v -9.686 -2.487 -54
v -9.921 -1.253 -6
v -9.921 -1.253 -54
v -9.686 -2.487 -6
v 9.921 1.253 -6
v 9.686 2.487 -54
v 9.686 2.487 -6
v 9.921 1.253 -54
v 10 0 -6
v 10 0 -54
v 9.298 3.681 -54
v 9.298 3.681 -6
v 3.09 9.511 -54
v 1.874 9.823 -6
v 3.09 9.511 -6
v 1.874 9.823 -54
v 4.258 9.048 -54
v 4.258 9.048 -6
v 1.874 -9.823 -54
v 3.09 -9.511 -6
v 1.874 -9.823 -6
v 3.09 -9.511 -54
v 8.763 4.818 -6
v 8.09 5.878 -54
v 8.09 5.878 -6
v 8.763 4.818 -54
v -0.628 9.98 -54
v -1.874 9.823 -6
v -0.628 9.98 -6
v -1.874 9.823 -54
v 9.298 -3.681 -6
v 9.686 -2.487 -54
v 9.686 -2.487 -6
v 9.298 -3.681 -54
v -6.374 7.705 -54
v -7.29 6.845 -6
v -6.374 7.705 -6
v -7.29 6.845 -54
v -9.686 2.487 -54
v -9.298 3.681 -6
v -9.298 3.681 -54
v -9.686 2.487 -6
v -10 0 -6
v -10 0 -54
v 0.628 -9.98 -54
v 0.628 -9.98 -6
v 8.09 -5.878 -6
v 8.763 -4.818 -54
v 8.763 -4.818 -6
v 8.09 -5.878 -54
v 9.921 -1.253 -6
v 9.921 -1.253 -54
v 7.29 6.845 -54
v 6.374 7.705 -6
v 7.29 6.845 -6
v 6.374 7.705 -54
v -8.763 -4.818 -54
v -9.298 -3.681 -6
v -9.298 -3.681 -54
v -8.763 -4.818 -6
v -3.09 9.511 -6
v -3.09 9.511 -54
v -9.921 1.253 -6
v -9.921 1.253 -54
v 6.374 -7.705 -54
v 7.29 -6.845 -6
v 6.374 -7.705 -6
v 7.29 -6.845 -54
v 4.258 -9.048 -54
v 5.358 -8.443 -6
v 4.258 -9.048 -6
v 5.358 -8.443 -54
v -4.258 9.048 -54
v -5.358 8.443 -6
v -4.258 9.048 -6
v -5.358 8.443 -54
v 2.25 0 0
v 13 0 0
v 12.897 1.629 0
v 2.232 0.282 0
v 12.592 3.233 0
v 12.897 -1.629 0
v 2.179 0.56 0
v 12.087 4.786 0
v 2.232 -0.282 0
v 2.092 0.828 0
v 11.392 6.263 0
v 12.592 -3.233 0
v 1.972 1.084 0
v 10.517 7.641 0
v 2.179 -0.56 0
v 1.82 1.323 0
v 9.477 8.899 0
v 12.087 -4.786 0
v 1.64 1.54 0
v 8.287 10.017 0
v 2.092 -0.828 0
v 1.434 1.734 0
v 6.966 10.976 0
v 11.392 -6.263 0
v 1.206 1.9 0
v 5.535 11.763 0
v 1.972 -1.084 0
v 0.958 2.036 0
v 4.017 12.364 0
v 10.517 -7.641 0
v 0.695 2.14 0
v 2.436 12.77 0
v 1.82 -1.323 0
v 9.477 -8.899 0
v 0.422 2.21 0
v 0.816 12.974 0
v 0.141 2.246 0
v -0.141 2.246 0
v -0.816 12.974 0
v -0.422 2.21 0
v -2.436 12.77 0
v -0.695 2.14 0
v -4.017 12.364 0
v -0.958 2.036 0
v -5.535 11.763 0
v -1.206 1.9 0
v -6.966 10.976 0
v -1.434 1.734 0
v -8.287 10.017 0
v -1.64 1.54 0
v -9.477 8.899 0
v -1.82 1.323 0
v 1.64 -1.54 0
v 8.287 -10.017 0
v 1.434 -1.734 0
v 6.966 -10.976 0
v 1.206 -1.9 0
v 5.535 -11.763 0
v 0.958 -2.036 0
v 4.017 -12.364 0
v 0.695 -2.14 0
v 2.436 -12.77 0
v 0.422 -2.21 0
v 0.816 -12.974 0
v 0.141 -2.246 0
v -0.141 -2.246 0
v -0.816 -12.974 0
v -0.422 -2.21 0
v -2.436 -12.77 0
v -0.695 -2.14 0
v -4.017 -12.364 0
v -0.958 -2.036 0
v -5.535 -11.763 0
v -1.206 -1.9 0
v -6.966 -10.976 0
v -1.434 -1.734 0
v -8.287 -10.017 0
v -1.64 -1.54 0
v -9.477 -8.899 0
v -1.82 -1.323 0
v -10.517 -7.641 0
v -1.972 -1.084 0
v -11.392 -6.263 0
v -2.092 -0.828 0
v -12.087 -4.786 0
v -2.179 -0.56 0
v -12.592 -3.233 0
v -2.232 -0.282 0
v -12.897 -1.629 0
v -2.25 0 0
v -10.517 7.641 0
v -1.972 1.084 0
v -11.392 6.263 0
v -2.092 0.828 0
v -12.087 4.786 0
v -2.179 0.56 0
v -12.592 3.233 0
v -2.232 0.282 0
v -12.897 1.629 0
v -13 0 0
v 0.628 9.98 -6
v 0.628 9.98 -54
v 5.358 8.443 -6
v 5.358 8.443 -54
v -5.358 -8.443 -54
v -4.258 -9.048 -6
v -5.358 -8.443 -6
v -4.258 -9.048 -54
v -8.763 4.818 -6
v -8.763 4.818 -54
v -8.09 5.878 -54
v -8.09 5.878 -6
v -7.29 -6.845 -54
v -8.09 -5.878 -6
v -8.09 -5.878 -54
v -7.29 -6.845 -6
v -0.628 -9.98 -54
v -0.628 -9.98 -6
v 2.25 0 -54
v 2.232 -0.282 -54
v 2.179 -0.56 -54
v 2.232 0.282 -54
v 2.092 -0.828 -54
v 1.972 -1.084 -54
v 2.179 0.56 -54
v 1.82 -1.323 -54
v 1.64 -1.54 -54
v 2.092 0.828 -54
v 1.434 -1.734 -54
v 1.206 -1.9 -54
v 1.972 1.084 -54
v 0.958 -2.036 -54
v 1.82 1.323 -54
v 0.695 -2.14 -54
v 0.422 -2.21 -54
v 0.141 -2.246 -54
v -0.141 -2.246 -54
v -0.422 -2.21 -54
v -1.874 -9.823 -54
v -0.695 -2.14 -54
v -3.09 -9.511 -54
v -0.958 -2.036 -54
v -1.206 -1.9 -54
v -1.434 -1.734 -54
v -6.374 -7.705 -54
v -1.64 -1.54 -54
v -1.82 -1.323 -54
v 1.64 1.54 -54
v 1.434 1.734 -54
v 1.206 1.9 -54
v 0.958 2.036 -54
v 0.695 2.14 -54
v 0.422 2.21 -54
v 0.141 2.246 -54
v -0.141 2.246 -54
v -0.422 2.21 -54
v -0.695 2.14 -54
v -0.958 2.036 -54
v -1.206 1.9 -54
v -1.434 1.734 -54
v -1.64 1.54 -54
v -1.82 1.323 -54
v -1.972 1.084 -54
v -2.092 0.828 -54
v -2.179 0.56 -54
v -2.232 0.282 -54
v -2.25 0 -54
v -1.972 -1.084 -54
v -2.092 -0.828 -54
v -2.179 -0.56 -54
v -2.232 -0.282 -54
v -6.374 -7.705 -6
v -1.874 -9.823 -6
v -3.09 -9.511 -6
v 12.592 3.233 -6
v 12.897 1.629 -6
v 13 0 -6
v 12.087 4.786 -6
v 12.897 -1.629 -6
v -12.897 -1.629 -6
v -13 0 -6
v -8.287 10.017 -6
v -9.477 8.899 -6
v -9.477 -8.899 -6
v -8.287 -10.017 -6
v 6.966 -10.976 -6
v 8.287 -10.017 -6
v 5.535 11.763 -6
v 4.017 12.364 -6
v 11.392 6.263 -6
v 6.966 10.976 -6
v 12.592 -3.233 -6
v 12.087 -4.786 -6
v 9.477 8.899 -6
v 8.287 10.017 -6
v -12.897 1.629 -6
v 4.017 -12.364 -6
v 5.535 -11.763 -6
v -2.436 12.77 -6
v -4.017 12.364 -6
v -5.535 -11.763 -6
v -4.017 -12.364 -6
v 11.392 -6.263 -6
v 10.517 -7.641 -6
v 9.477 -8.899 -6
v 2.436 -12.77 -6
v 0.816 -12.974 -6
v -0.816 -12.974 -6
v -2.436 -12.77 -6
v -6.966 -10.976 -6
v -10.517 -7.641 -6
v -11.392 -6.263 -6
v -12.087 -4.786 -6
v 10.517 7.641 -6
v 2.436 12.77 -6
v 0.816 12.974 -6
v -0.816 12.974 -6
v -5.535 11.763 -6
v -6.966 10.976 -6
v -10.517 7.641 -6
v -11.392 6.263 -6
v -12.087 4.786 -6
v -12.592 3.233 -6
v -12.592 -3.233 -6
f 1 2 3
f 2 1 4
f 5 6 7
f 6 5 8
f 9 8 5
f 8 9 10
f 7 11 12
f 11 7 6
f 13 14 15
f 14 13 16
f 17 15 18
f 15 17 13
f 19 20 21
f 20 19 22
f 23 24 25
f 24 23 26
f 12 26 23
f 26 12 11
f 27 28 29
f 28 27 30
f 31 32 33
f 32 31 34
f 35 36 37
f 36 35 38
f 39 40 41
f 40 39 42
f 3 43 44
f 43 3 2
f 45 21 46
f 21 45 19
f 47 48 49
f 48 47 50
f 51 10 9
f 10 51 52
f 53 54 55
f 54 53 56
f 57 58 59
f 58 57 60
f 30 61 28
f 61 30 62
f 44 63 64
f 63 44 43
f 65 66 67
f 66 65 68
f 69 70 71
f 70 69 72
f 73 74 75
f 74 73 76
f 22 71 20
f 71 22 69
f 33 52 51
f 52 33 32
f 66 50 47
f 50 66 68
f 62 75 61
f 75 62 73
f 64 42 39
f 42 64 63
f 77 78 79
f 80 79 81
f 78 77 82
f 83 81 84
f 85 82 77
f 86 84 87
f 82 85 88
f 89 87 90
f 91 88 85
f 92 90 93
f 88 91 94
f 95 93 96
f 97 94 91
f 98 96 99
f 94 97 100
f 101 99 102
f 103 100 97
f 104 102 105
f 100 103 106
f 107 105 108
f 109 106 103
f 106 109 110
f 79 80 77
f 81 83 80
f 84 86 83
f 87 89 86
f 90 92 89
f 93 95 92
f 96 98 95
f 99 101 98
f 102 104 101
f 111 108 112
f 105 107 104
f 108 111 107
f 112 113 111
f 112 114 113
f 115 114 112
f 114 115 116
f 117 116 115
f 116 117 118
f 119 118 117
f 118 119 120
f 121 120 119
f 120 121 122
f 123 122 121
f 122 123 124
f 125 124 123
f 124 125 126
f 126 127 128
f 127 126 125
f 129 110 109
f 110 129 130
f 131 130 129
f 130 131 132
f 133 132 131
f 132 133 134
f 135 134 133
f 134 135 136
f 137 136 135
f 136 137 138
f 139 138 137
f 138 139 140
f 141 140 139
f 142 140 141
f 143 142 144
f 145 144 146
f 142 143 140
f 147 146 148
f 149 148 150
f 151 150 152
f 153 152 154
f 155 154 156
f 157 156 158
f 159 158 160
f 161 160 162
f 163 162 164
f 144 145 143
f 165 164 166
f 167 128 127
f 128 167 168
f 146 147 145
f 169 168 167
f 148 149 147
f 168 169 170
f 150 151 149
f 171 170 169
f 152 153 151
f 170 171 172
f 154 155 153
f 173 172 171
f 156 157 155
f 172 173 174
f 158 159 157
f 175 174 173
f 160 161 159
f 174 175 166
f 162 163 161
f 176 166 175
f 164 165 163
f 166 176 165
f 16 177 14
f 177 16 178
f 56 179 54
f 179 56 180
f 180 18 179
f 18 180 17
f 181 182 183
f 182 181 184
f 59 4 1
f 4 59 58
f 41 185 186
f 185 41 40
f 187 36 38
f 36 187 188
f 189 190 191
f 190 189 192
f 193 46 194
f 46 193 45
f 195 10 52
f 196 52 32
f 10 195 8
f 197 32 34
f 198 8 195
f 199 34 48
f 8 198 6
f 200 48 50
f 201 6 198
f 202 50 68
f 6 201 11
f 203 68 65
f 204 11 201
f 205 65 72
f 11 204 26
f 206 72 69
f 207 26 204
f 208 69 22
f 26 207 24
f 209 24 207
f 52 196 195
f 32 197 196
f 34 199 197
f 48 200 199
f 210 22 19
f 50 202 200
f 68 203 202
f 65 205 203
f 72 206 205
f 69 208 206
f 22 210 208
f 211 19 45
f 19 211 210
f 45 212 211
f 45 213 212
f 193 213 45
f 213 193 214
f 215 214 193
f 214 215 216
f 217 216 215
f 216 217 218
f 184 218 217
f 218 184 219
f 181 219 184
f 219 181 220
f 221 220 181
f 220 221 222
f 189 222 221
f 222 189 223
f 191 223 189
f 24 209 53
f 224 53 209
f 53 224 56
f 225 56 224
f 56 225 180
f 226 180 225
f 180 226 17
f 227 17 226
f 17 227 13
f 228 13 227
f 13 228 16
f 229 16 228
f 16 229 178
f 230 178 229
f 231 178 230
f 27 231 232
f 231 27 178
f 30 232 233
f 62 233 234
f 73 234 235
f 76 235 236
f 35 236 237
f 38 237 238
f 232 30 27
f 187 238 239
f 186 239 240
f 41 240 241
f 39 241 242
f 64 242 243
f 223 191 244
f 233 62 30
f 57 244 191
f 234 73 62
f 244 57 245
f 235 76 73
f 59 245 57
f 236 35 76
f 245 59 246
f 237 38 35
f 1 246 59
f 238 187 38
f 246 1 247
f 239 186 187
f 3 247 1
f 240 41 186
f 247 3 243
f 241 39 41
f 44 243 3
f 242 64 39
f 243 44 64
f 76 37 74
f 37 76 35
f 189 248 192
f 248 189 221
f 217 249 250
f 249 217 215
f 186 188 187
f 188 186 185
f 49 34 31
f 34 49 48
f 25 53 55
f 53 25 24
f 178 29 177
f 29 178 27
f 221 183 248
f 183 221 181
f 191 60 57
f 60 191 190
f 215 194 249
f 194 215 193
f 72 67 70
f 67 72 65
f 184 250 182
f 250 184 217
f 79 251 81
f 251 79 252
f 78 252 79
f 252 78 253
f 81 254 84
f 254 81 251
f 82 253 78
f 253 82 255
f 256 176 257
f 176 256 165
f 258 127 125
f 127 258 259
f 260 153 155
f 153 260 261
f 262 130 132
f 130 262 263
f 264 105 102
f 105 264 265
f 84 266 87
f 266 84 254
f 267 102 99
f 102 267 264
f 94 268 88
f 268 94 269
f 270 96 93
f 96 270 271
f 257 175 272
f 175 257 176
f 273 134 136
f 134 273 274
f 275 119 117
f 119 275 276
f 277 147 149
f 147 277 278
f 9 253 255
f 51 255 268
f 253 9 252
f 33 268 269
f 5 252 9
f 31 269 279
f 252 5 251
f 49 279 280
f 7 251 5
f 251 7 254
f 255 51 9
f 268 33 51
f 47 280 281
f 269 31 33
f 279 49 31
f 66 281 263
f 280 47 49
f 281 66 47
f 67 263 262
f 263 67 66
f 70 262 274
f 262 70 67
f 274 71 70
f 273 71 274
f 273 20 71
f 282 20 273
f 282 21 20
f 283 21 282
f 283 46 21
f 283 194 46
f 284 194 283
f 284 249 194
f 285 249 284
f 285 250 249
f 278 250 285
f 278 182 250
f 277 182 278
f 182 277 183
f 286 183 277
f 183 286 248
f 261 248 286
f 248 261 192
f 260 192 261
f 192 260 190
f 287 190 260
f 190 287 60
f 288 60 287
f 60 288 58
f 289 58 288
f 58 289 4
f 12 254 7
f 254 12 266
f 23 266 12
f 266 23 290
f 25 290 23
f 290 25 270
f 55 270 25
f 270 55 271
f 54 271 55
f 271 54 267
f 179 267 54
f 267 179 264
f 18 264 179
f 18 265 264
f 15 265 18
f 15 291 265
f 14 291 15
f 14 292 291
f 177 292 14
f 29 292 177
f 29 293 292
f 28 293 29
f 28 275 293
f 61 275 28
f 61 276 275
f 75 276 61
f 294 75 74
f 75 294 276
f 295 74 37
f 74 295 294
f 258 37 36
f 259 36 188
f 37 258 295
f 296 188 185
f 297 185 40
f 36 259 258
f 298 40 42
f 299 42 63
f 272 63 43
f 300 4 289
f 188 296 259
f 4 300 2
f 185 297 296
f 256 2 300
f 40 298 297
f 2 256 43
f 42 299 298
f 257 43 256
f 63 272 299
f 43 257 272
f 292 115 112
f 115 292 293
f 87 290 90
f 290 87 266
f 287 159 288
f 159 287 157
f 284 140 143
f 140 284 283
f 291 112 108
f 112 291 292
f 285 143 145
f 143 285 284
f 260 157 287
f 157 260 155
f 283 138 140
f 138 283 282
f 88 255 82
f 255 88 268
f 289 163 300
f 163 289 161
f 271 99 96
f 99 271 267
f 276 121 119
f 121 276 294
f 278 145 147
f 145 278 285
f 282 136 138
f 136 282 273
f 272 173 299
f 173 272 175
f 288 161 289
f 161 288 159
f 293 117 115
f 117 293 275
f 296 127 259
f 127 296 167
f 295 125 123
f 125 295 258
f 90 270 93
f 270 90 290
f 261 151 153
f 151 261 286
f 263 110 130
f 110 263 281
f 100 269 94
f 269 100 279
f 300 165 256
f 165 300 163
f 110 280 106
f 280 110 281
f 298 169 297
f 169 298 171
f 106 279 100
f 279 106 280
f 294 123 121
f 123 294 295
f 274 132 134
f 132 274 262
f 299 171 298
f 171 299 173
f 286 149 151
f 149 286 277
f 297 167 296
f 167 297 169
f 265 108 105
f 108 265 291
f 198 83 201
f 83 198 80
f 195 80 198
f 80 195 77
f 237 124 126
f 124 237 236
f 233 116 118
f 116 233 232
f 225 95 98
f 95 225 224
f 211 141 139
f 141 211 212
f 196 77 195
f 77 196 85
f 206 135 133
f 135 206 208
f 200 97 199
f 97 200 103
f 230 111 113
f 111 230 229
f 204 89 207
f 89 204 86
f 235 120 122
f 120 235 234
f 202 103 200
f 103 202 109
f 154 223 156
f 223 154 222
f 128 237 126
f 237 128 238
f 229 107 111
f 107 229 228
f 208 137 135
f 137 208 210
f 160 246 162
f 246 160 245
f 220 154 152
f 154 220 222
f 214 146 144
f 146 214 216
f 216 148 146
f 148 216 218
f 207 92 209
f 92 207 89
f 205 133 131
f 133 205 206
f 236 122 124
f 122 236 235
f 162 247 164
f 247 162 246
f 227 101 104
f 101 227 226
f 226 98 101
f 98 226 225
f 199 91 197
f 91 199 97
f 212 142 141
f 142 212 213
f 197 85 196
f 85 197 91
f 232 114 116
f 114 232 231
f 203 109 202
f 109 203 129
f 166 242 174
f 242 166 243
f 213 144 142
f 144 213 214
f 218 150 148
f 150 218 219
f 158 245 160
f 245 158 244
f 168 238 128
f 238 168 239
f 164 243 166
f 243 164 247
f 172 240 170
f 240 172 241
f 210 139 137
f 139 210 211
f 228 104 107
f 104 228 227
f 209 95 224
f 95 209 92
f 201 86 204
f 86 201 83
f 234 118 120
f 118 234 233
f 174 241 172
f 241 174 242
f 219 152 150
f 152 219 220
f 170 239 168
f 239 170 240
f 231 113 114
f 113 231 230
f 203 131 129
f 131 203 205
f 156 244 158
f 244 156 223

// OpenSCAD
$fn = 50;


difference() {
	union() {
		translate(v = [0, 0, -54.0000000000]) {
			cylinder(h = 54, r = 10.0000000000);
		}
		translate(v = [0, 0, -6.0000000000]) {
			cylinder(h = 6, r = 13.0000000000);
		}
	}
	union() {
		#translate(v = [0, 0, -54]) {
			cylinder(h = 54, r = 2.2500000000);
		}
	}
}
